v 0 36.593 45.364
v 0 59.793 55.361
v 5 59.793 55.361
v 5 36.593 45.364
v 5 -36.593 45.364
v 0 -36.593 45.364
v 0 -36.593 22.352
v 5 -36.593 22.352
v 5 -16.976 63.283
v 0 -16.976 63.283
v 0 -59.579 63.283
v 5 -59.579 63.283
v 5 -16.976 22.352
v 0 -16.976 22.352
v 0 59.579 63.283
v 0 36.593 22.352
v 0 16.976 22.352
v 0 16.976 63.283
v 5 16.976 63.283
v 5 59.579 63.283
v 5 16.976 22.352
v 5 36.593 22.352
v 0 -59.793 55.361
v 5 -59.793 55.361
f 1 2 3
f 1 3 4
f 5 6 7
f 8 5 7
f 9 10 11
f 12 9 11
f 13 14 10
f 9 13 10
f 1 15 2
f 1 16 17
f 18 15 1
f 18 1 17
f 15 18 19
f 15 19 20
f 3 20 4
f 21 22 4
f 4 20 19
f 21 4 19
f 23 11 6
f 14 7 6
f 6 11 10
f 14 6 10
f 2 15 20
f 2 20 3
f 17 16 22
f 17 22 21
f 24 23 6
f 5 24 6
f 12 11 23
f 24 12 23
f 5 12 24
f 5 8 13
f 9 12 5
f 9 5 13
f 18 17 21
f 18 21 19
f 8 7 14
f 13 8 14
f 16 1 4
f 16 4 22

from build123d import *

# Parameters (mm, degrees)
F1_DEPTH = 5


with BuildPart() as f1:
    # F0 (on Right) → F1 (new body)
    with BuildSketch(Plane.YZ):
        Polygon((-16.976047, 63.282937), (-59.5793, 63.282937), (-59.793413, 55.360775), (-36.592815, 45.363773), (-36.592815, 22.351798), (-16.976047, 22.351798), align=None)
    extrude(amount=F1_DEPTH)


with BuildPart() as f2_1:
    # F2: instance of F1
    add(f1.part.mirror(Plane.XZ))


solid = Compound([f1.part, f2_1.part])
